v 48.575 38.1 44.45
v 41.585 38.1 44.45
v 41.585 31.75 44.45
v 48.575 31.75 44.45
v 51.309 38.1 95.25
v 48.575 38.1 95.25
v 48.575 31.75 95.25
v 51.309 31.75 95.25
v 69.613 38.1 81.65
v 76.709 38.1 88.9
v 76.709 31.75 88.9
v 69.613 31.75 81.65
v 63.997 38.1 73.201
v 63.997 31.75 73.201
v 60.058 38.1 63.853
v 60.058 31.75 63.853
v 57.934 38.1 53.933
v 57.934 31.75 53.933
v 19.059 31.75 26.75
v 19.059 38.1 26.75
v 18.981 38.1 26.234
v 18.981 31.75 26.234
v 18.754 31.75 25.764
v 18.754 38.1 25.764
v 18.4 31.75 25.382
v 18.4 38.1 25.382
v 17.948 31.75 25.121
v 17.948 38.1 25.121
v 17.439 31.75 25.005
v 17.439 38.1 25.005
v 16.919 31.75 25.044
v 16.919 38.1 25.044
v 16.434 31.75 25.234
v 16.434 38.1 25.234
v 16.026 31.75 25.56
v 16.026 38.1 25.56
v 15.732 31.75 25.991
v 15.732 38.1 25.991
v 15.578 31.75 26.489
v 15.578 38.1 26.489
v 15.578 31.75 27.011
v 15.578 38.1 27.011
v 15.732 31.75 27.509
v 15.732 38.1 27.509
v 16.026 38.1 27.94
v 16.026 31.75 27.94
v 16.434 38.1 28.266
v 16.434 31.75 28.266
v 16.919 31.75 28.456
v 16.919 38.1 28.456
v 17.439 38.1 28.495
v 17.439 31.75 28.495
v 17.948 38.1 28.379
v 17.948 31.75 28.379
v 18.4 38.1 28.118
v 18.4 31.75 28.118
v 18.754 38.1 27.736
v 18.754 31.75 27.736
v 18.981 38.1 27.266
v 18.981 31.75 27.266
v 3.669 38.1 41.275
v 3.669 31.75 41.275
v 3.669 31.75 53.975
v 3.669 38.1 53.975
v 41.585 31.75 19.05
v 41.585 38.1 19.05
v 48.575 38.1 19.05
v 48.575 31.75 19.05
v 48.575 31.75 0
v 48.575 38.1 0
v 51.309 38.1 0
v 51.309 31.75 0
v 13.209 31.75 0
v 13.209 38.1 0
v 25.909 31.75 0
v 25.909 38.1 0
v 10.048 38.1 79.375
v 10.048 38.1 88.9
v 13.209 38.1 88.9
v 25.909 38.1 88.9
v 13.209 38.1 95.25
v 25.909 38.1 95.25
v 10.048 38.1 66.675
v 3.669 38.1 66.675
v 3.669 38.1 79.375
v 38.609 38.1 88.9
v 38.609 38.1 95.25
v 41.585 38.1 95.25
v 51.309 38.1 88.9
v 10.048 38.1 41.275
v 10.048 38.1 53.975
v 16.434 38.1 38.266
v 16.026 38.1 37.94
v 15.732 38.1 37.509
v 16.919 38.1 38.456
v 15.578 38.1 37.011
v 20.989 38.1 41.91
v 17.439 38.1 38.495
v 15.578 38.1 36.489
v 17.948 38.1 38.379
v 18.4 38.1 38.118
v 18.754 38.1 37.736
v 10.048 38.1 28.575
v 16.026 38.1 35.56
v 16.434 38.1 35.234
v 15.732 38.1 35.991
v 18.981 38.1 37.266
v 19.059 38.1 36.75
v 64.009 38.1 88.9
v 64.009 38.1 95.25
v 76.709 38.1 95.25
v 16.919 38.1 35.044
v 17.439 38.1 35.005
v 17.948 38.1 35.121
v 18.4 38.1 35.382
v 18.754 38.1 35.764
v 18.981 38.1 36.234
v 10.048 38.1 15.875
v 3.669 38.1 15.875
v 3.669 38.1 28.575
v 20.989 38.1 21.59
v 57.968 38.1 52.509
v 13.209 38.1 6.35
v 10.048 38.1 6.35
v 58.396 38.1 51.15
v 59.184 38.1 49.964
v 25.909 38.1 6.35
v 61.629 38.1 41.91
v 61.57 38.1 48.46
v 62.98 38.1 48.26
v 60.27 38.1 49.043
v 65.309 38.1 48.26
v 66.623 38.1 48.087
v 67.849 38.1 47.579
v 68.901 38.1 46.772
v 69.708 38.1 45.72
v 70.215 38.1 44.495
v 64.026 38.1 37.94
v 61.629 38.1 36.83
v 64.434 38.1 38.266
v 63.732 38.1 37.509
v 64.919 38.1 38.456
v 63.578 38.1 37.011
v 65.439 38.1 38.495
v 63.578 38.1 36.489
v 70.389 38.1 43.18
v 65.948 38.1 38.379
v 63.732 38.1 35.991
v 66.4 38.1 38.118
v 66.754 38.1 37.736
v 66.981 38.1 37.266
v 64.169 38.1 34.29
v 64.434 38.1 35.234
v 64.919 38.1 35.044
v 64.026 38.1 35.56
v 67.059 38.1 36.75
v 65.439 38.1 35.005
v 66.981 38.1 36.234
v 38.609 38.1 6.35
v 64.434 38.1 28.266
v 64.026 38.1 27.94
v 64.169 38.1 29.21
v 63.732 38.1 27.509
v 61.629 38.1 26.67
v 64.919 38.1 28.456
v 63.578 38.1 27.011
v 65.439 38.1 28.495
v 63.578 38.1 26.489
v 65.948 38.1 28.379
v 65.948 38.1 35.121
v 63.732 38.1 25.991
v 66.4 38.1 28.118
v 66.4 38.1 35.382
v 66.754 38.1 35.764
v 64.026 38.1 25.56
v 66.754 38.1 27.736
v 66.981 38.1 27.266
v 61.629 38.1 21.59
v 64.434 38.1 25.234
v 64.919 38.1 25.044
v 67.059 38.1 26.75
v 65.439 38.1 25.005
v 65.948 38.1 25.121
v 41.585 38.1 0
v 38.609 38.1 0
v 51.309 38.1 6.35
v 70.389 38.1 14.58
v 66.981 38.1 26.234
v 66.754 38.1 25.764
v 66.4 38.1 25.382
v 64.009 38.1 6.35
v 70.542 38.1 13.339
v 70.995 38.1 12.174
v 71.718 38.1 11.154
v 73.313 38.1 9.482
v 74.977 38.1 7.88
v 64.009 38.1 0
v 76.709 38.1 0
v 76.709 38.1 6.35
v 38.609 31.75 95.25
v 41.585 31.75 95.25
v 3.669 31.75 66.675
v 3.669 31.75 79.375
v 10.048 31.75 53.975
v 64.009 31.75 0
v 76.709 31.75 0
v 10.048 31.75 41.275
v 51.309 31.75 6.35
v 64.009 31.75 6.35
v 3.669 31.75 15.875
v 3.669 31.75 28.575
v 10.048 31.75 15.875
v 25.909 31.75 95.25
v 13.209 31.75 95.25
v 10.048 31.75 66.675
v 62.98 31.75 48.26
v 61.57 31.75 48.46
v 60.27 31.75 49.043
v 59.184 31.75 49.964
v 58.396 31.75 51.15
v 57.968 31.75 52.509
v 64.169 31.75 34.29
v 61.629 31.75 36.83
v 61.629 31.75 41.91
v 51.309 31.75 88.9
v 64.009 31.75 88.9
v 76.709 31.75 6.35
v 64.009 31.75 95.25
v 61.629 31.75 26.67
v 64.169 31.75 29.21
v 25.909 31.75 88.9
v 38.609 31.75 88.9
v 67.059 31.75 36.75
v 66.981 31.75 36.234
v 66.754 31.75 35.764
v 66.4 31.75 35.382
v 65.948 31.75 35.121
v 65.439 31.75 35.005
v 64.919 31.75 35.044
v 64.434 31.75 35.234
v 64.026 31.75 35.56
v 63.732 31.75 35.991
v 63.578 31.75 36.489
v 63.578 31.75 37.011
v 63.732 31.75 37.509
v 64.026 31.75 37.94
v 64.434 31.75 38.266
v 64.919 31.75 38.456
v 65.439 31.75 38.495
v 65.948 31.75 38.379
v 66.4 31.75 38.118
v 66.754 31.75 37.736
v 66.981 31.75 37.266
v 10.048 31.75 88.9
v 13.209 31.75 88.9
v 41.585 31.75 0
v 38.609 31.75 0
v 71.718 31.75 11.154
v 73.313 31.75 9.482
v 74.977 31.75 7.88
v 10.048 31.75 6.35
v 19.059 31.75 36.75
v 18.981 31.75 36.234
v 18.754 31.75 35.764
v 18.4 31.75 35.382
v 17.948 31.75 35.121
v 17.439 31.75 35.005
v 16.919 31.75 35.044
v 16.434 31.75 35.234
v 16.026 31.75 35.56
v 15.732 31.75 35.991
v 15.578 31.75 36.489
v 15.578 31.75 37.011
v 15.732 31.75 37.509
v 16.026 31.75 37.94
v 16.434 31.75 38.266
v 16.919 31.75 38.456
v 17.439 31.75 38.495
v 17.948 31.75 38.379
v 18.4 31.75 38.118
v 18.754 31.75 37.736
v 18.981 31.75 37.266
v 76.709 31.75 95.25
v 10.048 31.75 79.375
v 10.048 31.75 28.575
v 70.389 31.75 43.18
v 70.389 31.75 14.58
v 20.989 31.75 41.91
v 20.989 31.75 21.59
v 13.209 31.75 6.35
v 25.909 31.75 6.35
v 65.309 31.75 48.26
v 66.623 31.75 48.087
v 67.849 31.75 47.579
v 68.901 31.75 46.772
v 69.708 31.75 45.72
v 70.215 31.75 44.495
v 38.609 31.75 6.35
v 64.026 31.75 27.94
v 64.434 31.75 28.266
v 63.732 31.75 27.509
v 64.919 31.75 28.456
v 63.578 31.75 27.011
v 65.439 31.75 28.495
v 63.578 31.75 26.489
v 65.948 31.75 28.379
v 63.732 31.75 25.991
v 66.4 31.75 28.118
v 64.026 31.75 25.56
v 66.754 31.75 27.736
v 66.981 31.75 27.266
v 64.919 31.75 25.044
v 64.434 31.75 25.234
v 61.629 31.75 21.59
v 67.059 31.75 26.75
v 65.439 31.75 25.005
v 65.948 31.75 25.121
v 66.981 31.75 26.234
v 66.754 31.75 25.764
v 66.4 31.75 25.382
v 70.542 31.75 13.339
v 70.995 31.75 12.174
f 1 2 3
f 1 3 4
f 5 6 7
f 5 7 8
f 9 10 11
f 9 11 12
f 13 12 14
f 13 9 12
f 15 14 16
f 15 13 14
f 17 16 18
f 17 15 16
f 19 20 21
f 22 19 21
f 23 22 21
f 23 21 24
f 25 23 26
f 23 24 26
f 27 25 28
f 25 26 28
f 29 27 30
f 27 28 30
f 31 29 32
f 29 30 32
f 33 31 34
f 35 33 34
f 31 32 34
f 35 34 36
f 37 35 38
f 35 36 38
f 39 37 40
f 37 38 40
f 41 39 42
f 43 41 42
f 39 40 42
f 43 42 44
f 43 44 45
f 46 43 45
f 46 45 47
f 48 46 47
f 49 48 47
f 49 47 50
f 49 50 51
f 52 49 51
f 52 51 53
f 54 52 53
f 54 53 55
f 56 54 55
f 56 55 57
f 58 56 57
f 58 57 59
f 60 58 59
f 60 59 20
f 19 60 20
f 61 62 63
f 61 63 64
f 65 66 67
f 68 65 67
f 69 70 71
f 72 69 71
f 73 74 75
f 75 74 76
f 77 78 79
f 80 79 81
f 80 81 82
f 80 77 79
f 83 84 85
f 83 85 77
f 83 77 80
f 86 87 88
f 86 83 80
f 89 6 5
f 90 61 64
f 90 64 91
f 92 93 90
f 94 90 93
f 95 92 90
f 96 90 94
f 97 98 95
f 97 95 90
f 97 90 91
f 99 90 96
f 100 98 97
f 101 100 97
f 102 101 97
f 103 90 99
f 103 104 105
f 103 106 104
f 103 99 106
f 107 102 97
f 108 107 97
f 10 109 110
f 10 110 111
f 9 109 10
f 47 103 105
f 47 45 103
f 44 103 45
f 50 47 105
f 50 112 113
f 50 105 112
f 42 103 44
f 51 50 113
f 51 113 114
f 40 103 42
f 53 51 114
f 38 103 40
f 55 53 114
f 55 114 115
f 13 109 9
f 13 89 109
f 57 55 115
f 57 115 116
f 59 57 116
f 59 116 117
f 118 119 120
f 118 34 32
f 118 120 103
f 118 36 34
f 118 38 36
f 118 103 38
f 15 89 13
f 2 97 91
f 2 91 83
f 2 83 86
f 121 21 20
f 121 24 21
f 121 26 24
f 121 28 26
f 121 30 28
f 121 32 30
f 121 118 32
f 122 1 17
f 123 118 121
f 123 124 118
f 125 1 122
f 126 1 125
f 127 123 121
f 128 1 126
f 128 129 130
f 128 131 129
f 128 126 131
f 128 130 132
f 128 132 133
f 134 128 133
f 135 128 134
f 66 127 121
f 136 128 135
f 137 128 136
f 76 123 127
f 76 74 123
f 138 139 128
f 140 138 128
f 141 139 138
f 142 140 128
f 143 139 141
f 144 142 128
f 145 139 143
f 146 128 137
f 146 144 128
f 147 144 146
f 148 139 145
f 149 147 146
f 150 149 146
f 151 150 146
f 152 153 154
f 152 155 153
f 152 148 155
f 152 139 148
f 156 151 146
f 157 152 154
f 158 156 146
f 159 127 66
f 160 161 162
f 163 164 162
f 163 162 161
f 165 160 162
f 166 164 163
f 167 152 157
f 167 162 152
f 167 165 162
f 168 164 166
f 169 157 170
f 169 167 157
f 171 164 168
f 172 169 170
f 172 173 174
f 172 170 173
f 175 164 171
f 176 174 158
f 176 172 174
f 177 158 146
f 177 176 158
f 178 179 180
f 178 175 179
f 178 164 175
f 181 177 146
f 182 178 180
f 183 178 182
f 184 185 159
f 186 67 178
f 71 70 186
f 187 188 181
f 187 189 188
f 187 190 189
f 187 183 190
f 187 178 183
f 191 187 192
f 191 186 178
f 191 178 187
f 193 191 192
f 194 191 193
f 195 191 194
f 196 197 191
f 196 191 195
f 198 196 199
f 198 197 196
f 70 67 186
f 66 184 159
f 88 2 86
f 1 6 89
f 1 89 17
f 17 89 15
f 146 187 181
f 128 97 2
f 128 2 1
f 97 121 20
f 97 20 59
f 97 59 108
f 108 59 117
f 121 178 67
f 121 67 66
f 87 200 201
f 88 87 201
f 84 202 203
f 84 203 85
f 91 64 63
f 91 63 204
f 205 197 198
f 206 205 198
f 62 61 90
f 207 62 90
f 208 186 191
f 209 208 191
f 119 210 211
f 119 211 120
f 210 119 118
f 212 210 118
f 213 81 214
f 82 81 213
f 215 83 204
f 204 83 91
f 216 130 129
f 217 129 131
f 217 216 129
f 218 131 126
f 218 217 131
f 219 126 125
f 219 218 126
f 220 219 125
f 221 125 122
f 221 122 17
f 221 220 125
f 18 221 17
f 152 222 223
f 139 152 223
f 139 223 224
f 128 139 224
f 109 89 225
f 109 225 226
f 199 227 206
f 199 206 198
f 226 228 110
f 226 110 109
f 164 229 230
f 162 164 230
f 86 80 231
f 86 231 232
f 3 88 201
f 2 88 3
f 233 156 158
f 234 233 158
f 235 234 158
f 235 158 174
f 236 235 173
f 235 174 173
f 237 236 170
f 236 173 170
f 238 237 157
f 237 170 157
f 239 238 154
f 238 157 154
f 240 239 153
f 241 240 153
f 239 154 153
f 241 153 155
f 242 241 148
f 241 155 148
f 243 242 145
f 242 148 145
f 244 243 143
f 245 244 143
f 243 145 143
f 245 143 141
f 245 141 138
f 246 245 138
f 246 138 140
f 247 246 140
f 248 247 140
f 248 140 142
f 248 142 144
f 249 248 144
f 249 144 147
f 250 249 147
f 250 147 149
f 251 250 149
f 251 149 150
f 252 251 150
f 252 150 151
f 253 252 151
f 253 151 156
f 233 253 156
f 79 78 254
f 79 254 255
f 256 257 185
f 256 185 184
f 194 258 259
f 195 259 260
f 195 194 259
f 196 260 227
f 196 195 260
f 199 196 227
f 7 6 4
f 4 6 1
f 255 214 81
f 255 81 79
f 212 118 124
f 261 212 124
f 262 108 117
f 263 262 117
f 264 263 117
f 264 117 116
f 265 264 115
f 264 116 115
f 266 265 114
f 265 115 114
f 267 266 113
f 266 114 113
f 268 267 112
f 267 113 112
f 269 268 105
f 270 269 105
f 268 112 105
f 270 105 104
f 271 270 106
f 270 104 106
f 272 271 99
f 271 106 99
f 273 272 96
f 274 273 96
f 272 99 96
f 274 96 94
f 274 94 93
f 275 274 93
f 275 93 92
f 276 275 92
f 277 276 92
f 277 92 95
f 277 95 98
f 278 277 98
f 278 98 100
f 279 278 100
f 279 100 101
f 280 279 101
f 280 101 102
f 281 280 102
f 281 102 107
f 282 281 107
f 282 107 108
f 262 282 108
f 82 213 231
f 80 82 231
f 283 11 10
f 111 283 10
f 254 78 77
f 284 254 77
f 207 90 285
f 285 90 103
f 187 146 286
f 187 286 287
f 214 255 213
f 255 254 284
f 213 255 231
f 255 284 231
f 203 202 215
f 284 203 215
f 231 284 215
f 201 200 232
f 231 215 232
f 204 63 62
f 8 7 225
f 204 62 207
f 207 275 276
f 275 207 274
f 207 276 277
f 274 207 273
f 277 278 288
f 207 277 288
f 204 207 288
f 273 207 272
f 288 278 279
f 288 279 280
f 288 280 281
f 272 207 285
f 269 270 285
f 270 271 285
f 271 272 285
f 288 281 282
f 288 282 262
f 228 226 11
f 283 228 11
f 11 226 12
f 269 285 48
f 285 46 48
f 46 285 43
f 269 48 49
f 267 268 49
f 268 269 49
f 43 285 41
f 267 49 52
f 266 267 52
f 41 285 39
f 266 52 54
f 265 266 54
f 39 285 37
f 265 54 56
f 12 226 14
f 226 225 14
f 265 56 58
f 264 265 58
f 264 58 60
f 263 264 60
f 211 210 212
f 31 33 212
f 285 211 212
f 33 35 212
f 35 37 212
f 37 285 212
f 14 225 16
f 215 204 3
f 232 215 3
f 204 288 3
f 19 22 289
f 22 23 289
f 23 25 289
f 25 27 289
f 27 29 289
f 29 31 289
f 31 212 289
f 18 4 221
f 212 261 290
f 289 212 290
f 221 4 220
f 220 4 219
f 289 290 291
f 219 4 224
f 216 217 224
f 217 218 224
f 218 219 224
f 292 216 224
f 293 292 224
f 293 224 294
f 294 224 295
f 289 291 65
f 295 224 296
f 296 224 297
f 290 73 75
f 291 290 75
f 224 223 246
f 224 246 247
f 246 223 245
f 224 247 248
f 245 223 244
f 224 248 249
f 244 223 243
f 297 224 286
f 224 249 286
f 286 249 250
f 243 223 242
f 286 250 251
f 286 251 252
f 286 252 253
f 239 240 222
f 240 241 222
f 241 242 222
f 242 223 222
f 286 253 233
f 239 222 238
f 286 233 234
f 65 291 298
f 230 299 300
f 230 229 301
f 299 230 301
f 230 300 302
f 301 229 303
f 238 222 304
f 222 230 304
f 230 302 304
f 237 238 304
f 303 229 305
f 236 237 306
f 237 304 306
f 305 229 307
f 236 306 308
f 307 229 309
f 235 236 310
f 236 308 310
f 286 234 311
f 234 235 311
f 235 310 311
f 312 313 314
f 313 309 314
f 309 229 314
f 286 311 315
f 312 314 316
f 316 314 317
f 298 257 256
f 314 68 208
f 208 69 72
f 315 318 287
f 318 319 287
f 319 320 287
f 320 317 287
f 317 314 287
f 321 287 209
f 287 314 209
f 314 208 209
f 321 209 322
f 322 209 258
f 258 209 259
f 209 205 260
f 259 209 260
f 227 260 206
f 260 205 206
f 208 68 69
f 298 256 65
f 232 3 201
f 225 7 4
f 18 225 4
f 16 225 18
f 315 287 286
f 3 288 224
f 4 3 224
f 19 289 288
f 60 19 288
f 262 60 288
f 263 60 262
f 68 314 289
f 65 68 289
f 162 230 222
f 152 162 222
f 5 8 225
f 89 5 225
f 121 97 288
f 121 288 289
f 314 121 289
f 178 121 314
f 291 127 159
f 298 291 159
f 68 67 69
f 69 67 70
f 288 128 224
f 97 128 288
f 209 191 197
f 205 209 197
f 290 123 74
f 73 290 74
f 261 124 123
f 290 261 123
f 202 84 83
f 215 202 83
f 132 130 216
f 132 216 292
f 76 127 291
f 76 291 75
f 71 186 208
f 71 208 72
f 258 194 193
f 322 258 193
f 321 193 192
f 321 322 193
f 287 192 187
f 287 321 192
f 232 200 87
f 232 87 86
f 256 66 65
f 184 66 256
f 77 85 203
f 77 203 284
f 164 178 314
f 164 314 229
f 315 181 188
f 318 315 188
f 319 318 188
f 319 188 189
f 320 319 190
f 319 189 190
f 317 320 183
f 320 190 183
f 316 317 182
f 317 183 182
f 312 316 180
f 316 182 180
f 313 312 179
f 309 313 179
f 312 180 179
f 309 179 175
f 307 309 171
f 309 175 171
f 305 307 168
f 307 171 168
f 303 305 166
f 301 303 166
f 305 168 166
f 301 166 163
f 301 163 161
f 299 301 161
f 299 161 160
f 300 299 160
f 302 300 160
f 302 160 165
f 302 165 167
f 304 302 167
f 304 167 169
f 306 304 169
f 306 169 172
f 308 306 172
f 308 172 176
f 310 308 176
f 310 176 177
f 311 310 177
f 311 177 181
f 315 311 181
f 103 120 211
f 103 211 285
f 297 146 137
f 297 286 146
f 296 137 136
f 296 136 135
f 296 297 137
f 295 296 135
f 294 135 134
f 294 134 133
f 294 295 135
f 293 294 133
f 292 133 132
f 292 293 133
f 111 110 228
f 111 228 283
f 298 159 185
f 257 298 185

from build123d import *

# Parameters (mm, degrees)
SKETCH2_W           = 73.039929049
SKETCH2_H           = 6.35
BOSS_EXTRUDE1_DEPTH = 95.25
SKETCH3_R           = 1.75
CUT_EXTRUDE1_DEPTH  = 7.35
CUT_EXTRUDE2_DEPTH  = 7.35
FILLET1_R           = 5.08
SKETCH8_W           = 6.990804807
SKETCH8_H           = 19.05
SKETCH8_H_2         = 50.8
CUT_EXTRUDE3_DEPTH  = 7.35
SKETCH9_W           = 12.7
SKETCH9_H           = 6.35
CUT_EXTRUDE4_DEPTH  = 7.35
LPATTERN1_COUNT     = 8
LPATTERN1_PITCH     = 25.4
SKETCH10_W          = 6.379369351
SKETCH10_H          = 15.875
SKETCH10_H_2        = 12.7
CUT_EXTRUDE5_DEPTH  = 7.35


with BuildPart() as part:
    # Sketch2 → Boss-Extrude1 (new body)
    with BuildSketch(Plane.XY):
        with Locations((40.188577261, 34.925)):
            Rectangle(SKETCH2_W, SKETCH2_H)
    extrude(amount=BOSS_EXTRUDE1_DEPTH)

    # Sketch3 → Cut-Extrude1 (cut, through all)
    with BuildSketch(Plane(origin=(0, 38.1, 0), x_dir=(1, 0, 0), z_dir=(0, 1, 0))):
        with Locations((17.308541785, -26.75)):
            Circle(SKETCH3_R)
        with Locations((17.308541785, -36.75)):
            Circle(SKETCH3_R)
        with Locations((65.308541785, -36.75)):
            Circle(SKETCH3_R)
        with Locations((65.308541785, -26.75)):
            Circle(SKETCH3_R)
        Polygon((64.168541785, -29.21), (64.168541785, -34.29), (61.628541785, -36.83), (61.628541785, -41.91), (20.988541785, -41.91), (20.988541785, -21.59), (61.628541785, -21.59), (61.628541785, -26.67), align=None)
    extrude(amount=-CUT_EXTRUDE1_DEPTH, mode=Mode.SUBTRACT)

    # Sketch6 → Cut-Extrude2 (cut, through all)
    with BuildSketch(Plane(origin=(0, 38.1, 0), x_dir=(1, 0, 0), z_dir=(0, 1, 0))):
        with BuildLine():
            Line((57.56896905, -48.26), (70.388541785, -48.26))
            Line((70.388541785, -48.26), (70.388541785, -12.664576304))
            ThreePointArc((70.388541785, -12.664576304), (73.417894551, -9.376528703), (76.708541785, -6.35))
            Line((76.708541785, -6.35), (76.708541785, -88.9))
            ThreePointArc((76.708541785, -88.9), (62.718427414, -70.661771391), (57.56896905, -48.26))
        make_face()
    extrude(amount=-CUT_EXTRUDE2_DEPTH, mode=Mode.SUBTRACT)

    # Fillet1
    fillet1_edges = [part.edges().sort_by_distance(p)[0] for p in [
        (57.56896905, 34.925, 48.26),
        (70.388541785, 34.925, 48.26),
        (70.388541785, 34.925, 12.664576304),
    ]]
    fillet(fillet1_edges, radius=FILLET1_R)

    # Sketch8 → Cut-Extrude3 (cut, through all)
    with BuildSketch(Plane(origin=(0, 38.1, 0), x_dir=(1, 0, 0), z_dir=(0, 1, 0))):
        with Locations((45.079952064, -9.525)):
            Rectangle(SKETCH8_W, SKETCH8_H)
        with Locations((45.079952064, -69.85)):
            Rectangle(SKETCH8_W, SKETCH8_H_2)
    extrude(amount=-CUT_EXTRUDE3_DEPTH, mode=Mode.SUBTRACT)

    # Sketch9 → Cut-Extrude4 (cut, through all)
    with BuildSketch(Plane(origin=(0, 38.1, 0), x_dir=(1, 0, 0), z_dir=(0, 1, 0))):
        with Locations((57.658541785, -3.175)):
            Rectangle(SKETCH9_W, SKETCH9_H)
        with Locations((57.658541785, -92.075)):
            Rectangle(SKETCH9_W, SKETCH9_H)
    cut_extrude4 = extrude(amount=-CUT_EXTRUDE4_DEPTH, mode=Mode.SUBTRACT)

    # LPattern1: Cut-Extrude4 ×8
    with Locations(*[(-i * LPATTERN1_PITCH, 0, 0) for i in range(1, LPATTERN1_COUNT)]):
        add(cut_extrude4, mode=Mode.SUBTRACT)

    # Sketch10 → Cut-Extrude5 (cut, through all)
    with BuildSketch(Plane(origin=(0, 38.1, 0), x_dir=(1, 0, 0), z_dir=(0, 1, 0))):
        with Locations((6.858297412, -7.9375)):
            Rectangle(SKETCH10_W, SKETCH10_H)
        with Locations((6.858297412, -87.3125)):
            Rectangle(SKETCH10_W, SKETCH10_H)
        with Locations((6.858297412, -60.325)):
            Rectangle(SKETCH10_W, SKETCH10_H_2)
        with Locations((6.858297412, -34.925)):
            Rectangle(SKETCH10_W, SKETCH10_H_2)
    extrude(amount=-CUT_EXTRUDE5_DEPTH, mode=Mode.SUBTRACT)


solid = part.part
